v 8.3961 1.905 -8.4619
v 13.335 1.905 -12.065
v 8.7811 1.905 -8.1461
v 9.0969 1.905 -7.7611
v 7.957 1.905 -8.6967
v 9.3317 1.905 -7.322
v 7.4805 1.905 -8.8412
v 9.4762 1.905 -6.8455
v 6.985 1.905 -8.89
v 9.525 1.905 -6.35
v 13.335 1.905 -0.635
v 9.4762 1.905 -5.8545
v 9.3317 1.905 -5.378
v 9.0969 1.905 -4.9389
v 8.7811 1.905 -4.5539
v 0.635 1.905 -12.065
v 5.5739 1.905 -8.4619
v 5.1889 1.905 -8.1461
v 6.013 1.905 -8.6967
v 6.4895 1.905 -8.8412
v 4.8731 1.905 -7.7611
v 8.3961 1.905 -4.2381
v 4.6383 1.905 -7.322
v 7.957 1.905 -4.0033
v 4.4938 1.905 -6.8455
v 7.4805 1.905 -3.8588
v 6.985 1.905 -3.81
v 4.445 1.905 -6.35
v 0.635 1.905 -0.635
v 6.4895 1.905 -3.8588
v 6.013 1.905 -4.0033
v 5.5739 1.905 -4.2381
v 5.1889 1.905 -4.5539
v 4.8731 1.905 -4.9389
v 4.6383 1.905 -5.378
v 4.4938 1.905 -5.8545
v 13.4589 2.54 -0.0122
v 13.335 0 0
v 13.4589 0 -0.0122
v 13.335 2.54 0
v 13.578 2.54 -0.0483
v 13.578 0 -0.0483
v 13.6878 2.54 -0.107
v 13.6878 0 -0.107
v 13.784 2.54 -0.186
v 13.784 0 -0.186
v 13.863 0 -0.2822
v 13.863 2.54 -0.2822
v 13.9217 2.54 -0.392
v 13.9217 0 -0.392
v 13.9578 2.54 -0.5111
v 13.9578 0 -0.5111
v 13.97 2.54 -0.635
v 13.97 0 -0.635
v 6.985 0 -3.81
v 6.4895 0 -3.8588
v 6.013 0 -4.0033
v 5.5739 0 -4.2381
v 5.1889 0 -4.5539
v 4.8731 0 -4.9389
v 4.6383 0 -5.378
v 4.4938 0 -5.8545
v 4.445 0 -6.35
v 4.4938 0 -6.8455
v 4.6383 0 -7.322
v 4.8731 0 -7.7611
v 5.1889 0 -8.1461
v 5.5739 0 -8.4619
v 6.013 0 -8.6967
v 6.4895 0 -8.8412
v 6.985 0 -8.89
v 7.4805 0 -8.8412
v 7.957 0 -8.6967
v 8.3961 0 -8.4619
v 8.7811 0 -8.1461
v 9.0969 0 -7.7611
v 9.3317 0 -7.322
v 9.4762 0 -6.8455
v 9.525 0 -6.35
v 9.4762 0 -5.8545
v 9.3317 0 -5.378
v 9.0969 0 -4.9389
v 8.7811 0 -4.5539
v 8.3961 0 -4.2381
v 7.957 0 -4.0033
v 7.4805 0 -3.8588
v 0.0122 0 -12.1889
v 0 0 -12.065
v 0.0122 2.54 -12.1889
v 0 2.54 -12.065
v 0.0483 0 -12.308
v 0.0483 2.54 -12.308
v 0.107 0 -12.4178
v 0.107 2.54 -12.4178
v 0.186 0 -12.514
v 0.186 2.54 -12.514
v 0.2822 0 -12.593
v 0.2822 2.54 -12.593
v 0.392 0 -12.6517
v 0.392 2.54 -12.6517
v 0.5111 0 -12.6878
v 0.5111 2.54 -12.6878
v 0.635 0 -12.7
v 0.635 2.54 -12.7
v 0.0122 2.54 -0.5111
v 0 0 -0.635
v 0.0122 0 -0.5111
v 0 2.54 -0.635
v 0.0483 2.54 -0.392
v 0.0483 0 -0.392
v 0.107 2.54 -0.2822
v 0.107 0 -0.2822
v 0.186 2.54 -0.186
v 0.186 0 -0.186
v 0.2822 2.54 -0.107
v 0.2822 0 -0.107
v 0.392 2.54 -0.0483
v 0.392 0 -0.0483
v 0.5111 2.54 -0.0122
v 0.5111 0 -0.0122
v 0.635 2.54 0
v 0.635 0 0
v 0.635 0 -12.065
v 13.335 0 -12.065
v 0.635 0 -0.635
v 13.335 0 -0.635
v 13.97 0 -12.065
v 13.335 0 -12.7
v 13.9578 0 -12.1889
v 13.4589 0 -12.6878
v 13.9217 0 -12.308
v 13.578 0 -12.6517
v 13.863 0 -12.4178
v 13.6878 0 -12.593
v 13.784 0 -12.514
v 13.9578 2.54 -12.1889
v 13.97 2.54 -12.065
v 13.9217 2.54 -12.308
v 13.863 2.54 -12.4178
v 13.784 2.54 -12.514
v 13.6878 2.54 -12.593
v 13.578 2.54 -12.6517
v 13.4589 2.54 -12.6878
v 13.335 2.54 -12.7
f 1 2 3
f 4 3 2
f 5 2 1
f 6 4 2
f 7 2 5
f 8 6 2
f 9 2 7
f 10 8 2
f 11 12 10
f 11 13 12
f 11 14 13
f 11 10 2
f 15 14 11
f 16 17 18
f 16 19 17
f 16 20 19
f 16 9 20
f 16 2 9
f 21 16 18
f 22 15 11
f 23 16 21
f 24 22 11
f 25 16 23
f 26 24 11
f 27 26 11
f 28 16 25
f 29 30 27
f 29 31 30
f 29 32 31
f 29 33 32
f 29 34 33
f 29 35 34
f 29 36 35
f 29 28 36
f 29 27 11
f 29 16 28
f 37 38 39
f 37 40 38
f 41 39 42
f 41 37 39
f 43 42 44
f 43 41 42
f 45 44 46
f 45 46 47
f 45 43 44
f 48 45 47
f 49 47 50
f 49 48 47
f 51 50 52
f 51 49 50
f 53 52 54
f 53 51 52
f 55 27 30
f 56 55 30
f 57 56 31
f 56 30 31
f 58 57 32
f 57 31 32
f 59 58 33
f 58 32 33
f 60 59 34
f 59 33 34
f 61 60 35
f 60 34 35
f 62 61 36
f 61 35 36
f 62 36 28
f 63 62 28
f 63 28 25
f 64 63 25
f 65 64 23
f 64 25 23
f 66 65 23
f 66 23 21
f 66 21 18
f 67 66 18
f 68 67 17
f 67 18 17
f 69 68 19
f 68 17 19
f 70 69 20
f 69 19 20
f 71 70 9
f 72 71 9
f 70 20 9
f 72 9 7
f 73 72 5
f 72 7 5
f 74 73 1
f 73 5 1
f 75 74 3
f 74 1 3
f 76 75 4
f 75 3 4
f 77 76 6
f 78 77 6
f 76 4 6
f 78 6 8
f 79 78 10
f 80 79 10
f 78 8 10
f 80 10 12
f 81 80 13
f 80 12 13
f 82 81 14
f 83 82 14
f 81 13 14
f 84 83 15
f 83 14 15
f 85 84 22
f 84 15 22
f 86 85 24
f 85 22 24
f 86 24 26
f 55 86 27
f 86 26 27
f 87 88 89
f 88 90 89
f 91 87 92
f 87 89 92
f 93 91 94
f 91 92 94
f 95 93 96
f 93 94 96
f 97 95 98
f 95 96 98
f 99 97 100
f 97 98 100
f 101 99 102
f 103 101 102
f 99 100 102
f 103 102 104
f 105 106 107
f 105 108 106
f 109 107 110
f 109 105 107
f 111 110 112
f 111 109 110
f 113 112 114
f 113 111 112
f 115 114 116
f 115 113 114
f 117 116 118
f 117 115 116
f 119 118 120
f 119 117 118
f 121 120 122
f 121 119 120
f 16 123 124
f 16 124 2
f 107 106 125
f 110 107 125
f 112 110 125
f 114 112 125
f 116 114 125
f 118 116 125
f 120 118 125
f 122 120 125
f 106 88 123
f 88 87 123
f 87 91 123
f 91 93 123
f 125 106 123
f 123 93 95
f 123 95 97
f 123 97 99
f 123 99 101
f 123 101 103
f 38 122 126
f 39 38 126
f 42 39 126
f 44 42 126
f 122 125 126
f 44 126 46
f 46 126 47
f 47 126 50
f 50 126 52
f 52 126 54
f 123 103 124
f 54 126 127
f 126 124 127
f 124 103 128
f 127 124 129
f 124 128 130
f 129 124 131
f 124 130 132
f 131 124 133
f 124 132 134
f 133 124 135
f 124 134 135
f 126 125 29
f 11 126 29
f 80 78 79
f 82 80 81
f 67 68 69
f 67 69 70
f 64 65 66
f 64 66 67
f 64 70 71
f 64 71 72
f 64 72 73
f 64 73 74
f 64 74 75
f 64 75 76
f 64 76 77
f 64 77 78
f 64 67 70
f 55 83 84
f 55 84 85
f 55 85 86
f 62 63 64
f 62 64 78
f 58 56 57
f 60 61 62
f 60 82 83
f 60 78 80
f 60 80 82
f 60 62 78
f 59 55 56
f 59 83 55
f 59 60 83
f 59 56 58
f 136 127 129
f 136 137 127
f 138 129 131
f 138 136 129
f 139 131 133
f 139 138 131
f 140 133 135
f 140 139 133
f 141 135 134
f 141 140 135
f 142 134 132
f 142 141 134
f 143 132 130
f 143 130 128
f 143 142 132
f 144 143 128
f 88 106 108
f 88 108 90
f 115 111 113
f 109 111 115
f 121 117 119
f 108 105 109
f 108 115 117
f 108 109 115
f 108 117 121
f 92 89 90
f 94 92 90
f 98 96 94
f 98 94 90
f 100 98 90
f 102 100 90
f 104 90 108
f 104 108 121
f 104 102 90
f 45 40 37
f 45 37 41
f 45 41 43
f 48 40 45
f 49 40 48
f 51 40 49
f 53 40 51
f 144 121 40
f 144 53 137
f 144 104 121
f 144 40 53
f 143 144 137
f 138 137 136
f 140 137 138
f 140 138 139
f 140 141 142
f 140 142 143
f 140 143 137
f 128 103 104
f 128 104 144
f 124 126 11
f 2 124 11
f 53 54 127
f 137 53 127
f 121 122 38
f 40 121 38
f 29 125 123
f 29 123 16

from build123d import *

# Parameters (mm, degrees)
SKETCH1_W           = 13.97
SKETCH1_H           = 12.7
BOSS_EXTRUDE1_DEPTH = 2.54
FILLET1_R           = 0.635
SHELL1_START        = 0.635
SHELL1_OUTLINE_W    = 1.905
SHELL1_OUTLINE_H    = 11.43
SHELL1_DEPTH        = 12.7
SKETCH2_R           = 2.54
BOSS_EXTRUDE2_DEPTH = 1.905


# Read off the part's stored shape, not the designer's step: Shell1
with BuildPart() as part:
    # Sketch1 → Boss-Extrude1 (new body)
    with BuildSketch(Plane(origin=(0, 0, 0), x_dir=(1, 0, 0), z_dir=(0, 1, 0))):
        with Locations((6.985, 6.35)):
            Rectangle(SKETCH1_W, SKETCH1_H)
    extrude(amount=BOSS_EXTRUDE1_DEPTH)

    # Fillet1
    fillet1_edges = [part.edges().sort_by_distance(p)[0] for p in [
        (0, 1.27, -12.7),
        (13.97, 1.27, -12.7),
        (13.97, 1.27, 0),
        (0, 1.27, 0),
    ]]
    fillet(fillet1_edges, radius=FILLET1_R)

    # Shell1 outline → Shell1 (cut)
    with BuildSketch(Plane.YZ.offset(SHELL1_START)):
        with Locations((0.9525, -6.35)):
            Rectangle(SHELL1_OUTLINE_W, SHELL1_OUTLINE_H)
    extrude(amount=SHELL1_DEPTH, mode=Mode.SUBTRACT)

    # Sketch2 → Boss-Extrude2 (add)
    with BuildSketch(Plane(origin=(0, 1.905, 0), x_dir=(-1, 0, 0), z_dir=(0, -1, 0))):
        with Locations(Location((-6.985, 6.35, 0), (0, 0, 270))):
            Circle(SKETCH2_R)
    extrude(amount=BOSS_EXTRUDE2_DEPTH)


solid = part.part
